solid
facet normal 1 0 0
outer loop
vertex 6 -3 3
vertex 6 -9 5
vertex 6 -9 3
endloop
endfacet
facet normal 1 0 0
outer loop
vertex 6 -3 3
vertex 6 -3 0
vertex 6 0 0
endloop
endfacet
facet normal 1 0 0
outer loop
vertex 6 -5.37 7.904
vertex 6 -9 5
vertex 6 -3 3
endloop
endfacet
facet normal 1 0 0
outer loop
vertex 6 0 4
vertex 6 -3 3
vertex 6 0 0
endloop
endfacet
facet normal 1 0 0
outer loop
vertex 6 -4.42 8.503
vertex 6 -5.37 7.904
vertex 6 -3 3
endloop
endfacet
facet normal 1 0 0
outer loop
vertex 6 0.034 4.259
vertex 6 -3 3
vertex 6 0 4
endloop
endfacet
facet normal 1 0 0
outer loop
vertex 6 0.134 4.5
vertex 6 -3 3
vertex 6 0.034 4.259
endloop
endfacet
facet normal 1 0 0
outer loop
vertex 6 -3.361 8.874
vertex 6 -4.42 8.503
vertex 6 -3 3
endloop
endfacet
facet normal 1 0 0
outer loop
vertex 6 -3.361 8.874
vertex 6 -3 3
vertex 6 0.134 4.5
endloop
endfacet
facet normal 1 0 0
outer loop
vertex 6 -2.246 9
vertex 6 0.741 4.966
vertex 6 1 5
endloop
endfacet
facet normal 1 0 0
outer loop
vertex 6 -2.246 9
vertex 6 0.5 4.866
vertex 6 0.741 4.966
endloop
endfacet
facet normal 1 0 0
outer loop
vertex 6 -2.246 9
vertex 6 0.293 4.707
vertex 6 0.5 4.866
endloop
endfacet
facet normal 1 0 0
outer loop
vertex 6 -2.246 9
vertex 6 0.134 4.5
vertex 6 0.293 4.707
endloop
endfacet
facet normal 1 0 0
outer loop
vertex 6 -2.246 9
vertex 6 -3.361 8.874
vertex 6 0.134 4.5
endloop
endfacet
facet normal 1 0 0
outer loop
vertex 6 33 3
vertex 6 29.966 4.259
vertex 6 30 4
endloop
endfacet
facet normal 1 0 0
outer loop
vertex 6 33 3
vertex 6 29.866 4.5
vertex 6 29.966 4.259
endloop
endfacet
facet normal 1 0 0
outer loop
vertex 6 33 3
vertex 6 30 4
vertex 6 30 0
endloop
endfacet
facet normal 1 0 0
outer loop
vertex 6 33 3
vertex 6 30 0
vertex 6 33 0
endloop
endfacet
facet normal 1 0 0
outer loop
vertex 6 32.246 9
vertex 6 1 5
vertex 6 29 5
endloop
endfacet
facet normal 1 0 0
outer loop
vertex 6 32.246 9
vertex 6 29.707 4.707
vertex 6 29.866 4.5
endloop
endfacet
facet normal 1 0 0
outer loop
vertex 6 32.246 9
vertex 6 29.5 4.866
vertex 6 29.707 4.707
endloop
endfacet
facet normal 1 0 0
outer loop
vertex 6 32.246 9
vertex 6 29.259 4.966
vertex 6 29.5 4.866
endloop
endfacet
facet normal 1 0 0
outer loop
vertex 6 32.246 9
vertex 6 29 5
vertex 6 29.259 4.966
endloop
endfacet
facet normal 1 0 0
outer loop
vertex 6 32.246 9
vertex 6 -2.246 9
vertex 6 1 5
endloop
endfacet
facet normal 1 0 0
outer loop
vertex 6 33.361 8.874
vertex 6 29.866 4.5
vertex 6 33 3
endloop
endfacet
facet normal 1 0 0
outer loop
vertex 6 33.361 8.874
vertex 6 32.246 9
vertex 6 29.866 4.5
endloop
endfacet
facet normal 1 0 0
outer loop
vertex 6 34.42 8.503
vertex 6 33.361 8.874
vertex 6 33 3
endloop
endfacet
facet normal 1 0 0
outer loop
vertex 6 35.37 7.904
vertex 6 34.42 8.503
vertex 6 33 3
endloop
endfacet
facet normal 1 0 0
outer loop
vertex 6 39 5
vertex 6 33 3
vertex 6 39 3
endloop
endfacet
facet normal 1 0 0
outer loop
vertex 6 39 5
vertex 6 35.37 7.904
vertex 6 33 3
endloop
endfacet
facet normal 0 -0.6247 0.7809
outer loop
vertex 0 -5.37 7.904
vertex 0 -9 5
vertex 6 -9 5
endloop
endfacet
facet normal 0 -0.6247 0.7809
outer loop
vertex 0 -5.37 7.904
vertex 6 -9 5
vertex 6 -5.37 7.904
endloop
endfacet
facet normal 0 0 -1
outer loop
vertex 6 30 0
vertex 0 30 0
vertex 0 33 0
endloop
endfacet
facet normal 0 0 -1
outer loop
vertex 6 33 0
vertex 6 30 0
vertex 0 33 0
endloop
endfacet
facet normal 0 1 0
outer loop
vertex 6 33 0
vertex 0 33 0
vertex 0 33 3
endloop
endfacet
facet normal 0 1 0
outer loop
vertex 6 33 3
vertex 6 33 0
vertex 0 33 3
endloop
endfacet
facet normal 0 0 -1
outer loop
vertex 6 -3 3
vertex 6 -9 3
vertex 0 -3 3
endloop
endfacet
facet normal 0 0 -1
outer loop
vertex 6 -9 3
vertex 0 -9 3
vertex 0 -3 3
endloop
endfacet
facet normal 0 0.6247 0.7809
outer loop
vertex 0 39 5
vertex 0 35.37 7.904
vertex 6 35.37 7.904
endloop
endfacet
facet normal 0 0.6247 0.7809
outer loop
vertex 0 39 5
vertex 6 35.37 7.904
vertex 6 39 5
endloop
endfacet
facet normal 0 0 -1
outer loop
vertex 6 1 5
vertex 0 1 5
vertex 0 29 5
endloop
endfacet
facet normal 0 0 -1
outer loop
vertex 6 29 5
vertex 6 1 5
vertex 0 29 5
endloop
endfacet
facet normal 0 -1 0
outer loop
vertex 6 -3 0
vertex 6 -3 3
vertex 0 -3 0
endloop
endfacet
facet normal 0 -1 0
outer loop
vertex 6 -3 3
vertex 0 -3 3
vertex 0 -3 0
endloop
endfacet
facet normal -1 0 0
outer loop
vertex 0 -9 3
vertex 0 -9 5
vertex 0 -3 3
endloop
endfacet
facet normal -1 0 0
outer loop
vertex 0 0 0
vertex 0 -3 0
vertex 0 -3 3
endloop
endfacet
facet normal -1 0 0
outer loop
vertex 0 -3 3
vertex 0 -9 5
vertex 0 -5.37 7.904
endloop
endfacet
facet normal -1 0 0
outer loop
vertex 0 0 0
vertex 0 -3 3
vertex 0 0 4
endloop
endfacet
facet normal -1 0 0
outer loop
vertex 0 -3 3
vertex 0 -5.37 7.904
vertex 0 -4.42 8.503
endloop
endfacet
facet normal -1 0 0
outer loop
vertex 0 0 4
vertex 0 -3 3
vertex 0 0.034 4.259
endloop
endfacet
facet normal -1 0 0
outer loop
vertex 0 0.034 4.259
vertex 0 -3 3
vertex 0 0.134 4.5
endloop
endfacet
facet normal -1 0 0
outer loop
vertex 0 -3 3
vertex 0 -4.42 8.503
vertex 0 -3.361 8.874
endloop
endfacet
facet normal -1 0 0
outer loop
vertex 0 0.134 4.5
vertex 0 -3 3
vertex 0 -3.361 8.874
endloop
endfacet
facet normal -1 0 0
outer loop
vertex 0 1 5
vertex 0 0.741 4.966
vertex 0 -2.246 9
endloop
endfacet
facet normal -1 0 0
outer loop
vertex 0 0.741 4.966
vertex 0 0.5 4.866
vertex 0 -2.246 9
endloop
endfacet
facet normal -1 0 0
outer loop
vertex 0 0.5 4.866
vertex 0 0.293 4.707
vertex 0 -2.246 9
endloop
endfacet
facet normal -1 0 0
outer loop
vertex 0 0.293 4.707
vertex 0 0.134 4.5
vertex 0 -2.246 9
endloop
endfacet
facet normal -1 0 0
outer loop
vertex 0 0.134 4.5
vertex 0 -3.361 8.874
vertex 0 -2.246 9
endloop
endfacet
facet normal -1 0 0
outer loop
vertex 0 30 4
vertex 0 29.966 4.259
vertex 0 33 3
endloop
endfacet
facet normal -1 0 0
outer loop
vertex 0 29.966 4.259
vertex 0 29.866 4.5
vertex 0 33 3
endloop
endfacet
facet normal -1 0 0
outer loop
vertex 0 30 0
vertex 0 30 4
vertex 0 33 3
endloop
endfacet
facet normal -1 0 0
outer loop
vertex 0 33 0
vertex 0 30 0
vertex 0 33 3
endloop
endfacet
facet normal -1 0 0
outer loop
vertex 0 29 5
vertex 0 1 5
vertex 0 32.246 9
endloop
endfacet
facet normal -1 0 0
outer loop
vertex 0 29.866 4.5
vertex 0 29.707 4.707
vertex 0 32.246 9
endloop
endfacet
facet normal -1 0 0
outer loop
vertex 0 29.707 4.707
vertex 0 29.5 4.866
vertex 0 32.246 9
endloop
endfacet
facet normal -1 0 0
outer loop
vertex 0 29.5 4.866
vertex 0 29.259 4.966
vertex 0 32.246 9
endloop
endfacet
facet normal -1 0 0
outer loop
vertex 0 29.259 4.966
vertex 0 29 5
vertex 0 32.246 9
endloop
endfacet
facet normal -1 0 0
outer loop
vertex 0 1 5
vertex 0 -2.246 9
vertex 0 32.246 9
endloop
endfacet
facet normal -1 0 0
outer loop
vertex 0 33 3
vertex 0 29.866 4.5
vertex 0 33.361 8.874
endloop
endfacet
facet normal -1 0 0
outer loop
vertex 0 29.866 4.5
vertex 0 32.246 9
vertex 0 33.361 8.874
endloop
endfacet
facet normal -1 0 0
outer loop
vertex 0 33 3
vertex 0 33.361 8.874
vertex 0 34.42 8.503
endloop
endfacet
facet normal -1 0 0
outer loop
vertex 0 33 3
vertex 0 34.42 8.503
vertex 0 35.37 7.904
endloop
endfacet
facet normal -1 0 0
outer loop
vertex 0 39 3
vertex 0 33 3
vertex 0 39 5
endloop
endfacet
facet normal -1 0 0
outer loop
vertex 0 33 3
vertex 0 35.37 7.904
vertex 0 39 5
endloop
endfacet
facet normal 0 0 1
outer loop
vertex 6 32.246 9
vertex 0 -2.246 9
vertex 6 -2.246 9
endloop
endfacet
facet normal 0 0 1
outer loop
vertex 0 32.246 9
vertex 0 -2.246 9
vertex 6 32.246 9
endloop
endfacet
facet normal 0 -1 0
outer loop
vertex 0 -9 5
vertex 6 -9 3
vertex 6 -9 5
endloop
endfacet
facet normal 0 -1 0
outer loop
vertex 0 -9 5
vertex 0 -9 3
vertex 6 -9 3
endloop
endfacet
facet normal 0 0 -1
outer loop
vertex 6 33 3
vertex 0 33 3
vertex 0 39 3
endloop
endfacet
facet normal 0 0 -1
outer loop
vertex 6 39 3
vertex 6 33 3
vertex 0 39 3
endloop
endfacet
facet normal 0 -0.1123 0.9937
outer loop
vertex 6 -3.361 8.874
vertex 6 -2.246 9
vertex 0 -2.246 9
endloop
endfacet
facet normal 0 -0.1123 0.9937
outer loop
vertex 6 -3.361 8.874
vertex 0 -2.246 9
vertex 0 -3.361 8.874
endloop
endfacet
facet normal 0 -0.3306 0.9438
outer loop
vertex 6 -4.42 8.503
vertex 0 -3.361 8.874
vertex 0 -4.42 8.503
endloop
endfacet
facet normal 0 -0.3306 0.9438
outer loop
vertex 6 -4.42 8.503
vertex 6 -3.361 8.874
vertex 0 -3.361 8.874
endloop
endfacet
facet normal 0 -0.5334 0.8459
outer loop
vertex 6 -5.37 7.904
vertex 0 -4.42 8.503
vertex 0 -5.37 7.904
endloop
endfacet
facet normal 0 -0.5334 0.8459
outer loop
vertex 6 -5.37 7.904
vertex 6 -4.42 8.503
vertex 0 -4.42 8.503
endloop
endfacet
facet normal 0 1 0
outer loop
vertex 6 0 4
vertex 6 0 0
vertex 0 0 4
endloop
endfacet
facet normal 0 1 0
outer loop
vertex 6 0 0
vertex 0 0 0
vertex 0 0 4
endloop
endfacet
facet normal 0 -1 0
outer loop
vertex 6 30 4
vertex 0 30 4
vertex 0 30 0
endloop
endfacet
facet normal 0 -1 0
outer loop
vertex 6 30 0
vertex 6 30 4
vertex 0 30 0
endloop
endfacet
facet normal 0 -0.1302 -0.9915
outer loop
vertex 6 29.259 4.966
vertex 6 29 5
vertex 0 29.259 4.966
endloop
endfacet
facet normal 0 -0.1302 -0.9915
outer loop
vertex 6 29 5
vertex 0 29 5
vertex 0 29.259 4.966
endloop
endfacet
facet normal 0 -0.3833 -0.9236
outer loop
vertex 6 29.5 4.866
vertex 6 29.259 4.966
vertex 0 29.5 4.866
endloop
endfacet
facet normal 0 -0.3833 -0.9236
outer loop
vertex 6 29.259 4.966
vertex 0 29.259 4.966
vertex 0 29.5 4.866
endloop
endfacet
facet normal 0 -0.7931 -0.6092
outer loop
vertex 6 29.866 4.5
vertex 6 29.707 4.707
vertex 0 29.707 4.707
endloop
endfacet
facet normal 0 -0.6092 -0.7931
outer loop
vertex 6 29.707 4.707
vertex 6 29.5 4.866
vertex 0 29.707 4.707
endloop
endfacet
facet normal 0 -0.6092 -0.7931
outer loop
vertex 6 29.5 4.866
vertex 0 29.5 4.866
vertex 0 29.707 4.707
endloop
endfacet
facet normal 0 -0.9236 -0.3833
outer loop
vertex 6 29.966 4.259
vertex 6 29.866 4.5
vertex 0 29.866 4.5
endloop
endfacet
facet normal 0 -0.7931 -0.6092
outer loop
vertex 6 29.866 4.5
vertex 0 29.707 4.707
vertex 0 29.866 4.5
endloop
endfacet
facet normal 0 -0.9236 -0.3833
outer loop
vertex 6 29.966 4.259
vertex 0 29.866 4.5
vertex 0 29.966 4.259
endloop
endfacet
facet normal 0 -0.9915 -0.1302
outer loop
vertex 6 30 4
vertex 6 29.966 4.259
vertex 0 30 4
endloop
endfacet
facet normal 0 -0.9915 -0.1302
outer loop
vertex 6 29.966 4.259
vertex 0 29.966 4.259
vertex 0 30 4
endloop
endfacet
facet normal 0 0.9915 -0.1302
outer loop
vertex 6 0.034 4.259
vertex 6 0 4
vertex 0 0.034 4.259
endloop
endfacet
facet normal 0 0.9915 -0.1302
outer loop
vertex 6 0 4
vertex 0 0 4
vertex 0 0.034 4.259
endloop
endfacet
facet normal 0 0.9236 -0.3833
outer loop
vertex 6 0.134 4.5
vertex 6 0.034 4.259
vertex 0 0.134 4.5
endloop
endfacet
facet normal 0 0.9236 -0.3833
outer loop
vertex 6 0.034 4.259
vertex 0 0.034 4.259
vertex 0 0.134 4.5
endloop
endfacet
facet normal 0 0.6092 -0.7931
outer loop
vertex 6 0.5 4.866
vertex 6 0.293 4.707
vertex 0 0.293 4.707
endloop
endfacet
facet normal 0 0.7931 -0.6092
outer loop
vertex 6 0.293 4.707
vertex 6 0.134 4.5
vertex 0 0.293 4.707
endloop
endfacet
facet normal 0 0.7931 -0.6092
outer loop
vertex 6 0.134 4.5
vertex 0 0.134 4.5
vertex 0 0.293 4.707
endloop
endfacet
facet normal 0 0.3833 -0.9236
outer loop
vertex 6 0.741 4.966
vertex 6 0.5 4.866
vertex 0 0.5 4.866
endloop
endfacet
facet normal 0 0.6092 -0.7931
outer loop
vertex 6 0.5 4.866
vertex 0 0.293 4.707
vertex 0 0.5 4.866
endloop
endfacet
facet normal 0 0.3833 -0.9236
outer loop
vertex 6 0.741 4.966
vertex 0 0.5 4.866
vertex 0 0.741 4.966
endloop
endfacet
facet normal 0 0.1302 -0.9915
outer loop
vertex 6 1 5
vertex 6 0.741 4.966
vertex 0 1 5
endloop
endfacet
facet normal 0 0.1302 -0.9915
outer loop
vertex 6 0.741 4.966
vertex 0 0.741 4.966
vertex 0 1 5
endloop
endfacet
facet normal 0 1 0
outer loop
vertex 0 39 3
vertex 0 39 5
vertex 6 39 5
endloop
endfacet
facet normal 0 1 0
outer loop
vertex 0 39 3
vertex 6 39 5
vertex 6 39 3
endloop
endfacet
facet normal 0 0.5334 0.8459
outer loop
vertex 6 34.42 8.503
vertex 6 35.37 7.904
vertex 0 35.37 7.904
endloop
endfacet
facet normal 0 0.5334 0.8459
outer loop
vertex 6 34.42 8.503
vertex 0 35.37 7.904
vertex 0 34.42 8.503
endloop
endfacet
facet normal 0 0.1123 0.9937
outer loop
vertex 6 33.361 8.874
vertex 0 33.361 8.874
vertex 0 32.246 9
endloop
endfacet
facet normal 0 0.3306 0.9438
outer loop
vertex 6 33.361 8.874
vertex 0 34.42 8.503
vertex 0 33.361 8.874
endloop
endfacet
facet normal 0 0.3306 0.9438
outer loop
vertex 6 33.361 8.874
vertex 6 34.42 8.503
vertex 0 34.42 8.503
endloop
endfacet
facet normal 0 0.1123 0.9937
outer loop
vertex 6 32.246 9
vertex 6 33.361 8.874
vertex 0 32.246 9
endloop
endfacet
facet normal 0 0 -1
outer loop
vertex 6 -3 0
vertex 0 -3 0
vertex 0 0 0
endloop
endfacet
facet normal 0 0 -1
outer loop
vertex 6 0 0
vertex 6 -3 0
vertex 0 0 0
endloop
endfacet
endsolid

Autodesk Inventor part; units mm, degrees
ref_plane "YZ Plane" through (0, 0, 0) normal (1, 0, 0) x (0, 1, 0)
ref_plane "XZ Plane" through (0, 0, 0) normal (0, 1, 0) x (-1, 0, 0)
ref_plane "XY Plane" through (0, 0, 0) normal (0, 0, 1) x (1, 0, 0)
sketch "Sketch1" plane through (0, 0, 0) normal (1, 0, 0) x (0, 1, 0)
  line L0 (30, 0) -> (33, 0)
  line L1 (33, 0) -> (33, 3)
  line L2 (33, 3) -> (39, 3)
  line L3 (-9, 3) -> (-3, 3)
  line L4 (-3, 3) -> (-3, 0)
  line L5 (-3, 0) -> (0, 0)
  line L6 (0, 0) -> (0, 4)
  line L7 (1, 5) -> (29, 5)
  line L8 (30, 4) -> (30, 0)
  arc A0 (1, 5) -> (0, 4) centre (1, 4) ccw
  arc A1 (30, 4) -> (29, 5) centre (29, 4) ccw
  line L9 (-4, 9) -> (34, 9)
  line L10 (34, 9) -> (39, 5)
  line L11 (39, 5) -> (39, 3)
  line L12 (-9, 3) -> (-9, 5)
  line L13 (-9, 5) -> (-4, 9)
  point P0 (0, 0)
  point P1 (0, 5)
  point P2 (30, 5)
  point P3 (15, 9)
  point P4 (15, 5)
  dimension "d1" = 3
  dimension "d4" = 30
  dimension "d5" = 2
  dimension "d7" = 3
  dimension "d30" = 38
  dimension "d31" = 4
  dimension "d32" = 2
  dimension "d33" = 2
  dimension "d36" = 3
  dimension "d37" = 3
  dimension "d41" = 6
  dimension "d42" = 6
extrude "Extrusion1" add sketch "Sketch1" along normal blind 6
fillet "Fillet1" radius 5 2 edges at (3, -4, 9) (3, 34, 9)
properties part number "27080914ServoMount"
